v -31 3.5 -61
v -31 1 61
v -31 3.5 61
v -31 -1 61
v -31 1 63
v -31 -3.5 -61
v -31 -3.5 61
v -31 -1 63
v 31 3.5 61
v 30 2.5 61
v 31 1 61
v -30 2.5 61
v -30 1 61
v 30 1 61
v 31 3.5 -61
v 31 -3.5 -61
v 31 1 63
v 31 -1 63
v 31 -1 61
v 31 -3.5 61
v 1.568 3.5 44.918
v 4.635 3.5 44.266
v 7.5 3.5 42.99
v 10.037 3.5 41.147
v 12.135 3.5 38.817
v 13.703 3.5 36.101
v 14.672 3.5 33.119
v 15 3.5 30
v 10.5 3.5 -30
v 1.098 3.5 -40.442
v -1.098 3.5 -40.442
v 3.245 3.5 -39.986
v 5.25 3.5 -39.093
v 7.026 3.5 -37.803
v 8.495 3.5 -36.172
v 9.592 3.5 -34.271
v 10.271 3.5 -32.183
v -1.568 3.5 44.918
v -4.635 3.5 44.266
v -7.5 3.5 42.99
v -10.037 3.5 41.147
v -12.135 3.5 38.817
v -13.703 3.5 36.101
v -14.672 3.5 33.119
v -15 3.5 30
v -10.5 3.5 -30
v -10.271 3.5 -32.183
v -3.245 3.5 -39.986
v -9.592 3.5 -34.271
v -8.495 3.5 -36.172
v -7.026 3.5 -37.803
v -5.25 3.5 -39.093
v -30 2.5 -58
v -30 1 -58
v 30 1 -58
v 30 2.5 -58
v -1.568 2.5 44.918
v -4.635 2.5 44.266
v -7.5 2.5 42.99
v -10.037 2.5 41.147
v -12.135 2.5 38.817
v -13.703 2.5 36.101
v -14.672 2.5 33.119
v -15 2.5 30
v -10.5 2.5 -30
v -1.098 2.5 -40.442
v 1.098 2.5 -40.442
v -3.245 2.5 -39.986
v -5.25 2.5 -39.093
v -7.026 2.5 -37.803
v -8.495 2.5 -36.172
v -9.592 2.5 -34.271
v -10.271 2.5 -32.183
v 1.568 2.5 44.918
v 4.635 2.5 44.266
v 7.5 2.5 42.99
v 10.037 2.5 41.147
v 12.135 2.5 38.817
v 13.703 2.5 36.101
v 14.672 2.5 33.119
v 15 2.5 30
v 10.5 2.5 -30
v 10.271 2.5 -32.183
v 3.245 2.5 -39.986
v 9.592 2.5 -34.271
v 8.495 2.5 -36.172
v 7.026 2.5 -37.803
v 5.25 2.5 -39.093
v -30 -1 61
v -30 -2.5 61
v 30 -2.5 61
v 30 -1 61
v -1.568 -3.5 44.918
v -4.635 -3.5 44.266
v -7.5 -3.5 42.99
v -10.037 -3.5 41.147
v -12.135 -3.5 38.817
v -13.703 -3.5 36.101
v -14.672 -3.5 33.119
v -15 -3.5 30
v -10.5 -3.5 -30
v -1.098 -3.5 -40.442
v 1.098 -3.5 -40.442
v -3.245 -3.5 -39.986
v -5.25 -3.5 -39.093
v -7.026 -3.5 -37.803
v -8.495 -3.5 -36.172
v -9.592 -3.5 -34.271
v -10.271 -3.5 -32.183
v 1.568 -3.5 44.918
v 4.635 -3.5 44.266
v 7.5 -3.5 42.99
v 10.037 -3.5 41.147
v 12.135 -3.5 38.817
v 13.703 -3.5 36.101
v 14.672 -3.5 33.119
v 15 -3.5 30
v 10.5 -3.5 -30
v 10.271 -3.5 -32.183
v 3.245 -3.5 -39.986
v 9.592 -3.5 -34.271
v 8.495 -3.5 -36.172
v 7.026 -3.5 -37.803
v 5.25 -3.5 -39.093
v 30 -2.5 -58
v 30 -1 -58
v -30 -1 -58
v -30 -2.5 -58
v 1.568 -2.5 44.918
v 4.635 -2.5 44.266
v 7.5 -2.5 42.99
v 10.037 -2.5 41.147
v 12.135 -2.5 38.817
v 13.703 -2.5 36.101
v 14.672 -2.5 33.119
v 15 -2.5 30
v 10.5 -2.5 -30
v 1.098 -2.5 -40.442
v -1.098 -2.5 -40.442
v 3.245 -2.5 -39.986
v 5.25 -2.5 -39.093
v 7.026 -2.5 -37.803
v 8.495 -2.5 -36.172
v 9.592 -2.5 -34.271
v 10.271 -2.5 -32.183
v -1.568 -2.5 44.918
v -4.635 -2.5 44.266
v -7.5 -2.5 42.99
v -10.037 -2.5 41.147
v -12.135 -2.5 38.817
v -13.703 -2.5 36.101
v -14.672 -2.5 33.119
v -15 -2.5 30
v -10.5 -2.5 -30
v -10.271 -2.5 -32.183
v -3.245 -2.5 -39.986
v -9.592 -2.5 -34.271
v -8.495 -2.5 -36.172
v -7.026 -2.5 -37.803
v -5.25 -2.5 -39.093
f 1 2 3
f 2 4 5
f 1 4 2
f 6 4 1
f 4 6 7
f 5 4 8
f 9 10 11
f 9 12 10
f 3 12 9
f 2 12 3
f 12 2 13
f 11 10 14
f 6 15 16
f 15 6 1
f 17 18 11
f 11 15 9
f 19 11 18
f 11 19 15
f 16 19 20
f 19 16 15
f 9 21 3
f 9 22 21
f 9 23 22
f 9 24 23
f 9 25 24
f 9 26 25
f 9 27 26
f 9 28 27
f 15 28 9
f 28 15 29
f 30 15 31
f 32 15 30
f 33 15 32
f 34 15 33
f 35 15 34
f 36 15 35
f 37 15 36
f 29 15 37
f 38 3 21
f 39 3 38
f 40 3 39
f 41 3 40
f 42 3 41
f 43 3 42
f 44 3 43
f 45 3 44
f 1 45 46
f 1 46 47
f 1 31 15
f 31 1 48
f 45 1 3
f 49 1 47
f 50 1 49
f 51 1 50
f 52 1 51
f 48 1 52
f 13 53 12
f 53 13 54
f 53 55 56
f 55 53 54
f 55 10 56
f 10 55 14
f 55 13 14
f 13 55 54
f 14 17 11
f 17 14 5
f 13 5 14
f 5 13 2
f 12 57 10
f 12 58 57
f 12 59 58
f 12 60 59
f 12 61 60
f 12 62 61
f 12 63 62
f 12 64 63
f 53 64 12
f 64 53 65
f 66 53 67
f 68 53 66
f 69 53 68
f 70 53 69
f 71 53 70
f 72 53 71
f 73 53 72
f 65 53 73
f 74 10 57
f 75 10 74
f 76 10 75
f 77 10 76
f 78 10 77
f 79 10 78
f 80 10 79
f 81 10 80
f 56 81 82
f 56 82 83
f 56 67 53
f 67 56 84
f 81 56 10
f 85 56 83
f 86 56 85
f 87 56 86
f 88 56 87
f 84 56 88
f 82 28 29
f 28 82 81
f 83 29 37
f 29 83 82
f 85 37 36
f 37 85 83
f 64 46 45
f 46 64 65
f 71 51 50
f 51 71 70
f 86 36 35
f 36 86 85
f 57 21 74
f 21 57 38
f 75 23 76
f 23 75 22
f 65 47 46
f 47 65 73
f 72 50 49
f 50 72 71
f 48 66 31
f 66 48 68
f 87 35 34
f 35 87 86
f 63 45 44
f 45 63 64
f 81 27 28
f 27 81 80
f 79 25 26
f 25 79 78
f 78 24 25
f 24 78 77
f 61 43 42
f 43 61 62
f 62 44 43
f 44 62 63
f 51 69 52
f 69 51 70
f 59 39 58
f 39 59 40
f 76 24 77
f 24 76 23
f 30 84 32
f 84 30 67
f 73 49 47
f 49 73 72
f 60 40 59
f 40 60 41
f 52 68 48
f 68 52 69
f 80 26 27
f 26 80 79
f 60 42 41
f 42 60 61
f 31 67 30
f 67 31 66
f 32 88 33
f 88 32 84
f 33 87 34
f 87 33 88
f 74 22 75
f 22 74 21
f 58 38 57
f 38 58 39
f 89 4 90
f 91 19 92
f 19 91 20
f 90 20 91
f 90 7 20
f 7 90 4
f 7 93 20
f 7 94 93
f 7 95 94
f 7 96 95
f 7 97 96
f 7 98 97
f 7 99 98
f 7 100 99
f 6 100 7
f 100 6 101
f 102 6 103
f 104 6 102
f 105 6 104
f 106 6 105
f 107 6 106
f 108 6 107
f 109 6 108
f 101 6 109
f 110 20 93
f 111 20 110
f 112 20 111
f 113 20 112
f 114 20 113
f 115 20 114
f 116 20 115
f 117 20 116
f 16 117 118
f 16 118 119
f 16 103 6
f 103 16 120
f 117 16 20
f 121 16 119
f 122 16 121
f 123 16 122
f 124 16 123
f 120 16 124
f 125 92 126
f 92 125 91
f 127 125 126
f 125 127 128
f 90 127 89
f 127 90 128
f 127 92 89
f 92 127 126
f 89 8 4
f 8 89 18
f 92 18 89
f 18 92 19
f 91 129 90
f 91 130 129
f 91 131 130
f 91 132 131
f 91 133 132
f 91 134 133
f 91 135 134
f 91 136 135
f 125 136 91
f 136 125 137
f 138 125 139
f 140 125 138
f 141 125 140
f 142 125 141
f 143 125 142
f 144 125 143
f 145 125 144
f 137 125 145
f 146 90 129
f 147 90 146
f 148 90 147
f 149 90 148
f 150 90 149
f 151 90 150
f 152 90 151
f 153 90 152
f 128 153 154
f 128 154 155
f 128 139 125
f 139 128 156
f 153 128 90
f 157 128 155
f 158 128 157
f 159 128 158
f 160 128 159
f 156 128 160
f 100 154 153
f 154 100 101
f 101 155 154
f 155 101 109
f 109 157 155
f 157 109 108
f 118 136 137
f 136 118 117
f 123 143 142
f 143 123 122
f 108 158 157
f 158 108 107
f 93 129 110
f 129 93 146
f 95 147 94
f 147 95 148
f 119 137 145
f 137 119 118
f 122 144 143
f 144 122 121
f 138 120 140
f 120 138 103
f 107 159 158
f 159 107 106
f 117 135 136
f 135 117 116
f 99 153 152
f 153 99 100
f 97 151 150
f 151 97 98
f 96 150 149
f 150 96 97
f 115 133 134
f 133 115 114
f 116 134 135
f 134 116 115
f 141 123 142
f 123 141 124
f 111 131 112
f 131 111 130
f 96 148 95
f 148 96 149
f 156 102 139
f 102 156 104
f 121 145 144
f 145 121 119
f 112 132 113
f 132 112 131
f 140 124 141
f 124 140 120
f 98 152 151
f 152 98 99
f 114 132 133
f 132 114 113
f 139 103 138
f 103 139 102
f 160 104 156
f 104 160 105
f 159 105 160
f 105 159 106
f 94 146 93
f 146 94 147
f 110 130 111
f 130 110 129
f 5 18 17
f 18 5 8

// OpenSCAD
//

innen_x = 60;
innen_y = 1.5;
innen_z = 120;
wand = 2;
aussen_x = innen_x + wand;
aussen_y = innen_y + wand;
aussen_z = innen_z + wand;
cylinder_1_d = innen_x * 0.50;
cylinder_2_d = innen_x * 0.35;

module cover () {
    difference() {
        // Außengehäuse
        cube([aussen_x, aussen_y, aussen_z], center=true);
        
        // Innengehäuse
        translate([0, 0, wand])
        cube([innen_x, innen_y, innen_z], center=true);
        translate([0, -aussen_y/2 + wand, 0])
        aussparung2();
    }
}

module aussparung2(){
    c_y = innen_z/4;
    rotate([90, 0, 0])
    linear_extrude(height=wand*1.05)
    union() {
        translate([0, c_y, 0])
        circle(d=cylinder_1_d);
        translate([0, -c_y, 0])
        circle(d=cylinder_2_d);
        polygon(points=[
            [cylinder_1_d/2, c_y],
            [cylinder_2_d/2, -c_y],
            [-cylinder_2_d/2, -c_y],
            [-cylinder_1_d/2, c_y]
        ]);
    };
}
//minkowski() {
union() {
translate([0, aussen_y/2 + 0*wand/2, 0])
rotate([0, 0, 180])
cover();

translate([0, 0, wand/2])
cube([aussen_x, wand, aussen_z + wand], center=true);

translate([0, -aussen_y/2 - 0*wand/2, 0])
rotate([0, 0, 0])
cover();
};
//cylinder(r=0.66, h=0.2);
//}
